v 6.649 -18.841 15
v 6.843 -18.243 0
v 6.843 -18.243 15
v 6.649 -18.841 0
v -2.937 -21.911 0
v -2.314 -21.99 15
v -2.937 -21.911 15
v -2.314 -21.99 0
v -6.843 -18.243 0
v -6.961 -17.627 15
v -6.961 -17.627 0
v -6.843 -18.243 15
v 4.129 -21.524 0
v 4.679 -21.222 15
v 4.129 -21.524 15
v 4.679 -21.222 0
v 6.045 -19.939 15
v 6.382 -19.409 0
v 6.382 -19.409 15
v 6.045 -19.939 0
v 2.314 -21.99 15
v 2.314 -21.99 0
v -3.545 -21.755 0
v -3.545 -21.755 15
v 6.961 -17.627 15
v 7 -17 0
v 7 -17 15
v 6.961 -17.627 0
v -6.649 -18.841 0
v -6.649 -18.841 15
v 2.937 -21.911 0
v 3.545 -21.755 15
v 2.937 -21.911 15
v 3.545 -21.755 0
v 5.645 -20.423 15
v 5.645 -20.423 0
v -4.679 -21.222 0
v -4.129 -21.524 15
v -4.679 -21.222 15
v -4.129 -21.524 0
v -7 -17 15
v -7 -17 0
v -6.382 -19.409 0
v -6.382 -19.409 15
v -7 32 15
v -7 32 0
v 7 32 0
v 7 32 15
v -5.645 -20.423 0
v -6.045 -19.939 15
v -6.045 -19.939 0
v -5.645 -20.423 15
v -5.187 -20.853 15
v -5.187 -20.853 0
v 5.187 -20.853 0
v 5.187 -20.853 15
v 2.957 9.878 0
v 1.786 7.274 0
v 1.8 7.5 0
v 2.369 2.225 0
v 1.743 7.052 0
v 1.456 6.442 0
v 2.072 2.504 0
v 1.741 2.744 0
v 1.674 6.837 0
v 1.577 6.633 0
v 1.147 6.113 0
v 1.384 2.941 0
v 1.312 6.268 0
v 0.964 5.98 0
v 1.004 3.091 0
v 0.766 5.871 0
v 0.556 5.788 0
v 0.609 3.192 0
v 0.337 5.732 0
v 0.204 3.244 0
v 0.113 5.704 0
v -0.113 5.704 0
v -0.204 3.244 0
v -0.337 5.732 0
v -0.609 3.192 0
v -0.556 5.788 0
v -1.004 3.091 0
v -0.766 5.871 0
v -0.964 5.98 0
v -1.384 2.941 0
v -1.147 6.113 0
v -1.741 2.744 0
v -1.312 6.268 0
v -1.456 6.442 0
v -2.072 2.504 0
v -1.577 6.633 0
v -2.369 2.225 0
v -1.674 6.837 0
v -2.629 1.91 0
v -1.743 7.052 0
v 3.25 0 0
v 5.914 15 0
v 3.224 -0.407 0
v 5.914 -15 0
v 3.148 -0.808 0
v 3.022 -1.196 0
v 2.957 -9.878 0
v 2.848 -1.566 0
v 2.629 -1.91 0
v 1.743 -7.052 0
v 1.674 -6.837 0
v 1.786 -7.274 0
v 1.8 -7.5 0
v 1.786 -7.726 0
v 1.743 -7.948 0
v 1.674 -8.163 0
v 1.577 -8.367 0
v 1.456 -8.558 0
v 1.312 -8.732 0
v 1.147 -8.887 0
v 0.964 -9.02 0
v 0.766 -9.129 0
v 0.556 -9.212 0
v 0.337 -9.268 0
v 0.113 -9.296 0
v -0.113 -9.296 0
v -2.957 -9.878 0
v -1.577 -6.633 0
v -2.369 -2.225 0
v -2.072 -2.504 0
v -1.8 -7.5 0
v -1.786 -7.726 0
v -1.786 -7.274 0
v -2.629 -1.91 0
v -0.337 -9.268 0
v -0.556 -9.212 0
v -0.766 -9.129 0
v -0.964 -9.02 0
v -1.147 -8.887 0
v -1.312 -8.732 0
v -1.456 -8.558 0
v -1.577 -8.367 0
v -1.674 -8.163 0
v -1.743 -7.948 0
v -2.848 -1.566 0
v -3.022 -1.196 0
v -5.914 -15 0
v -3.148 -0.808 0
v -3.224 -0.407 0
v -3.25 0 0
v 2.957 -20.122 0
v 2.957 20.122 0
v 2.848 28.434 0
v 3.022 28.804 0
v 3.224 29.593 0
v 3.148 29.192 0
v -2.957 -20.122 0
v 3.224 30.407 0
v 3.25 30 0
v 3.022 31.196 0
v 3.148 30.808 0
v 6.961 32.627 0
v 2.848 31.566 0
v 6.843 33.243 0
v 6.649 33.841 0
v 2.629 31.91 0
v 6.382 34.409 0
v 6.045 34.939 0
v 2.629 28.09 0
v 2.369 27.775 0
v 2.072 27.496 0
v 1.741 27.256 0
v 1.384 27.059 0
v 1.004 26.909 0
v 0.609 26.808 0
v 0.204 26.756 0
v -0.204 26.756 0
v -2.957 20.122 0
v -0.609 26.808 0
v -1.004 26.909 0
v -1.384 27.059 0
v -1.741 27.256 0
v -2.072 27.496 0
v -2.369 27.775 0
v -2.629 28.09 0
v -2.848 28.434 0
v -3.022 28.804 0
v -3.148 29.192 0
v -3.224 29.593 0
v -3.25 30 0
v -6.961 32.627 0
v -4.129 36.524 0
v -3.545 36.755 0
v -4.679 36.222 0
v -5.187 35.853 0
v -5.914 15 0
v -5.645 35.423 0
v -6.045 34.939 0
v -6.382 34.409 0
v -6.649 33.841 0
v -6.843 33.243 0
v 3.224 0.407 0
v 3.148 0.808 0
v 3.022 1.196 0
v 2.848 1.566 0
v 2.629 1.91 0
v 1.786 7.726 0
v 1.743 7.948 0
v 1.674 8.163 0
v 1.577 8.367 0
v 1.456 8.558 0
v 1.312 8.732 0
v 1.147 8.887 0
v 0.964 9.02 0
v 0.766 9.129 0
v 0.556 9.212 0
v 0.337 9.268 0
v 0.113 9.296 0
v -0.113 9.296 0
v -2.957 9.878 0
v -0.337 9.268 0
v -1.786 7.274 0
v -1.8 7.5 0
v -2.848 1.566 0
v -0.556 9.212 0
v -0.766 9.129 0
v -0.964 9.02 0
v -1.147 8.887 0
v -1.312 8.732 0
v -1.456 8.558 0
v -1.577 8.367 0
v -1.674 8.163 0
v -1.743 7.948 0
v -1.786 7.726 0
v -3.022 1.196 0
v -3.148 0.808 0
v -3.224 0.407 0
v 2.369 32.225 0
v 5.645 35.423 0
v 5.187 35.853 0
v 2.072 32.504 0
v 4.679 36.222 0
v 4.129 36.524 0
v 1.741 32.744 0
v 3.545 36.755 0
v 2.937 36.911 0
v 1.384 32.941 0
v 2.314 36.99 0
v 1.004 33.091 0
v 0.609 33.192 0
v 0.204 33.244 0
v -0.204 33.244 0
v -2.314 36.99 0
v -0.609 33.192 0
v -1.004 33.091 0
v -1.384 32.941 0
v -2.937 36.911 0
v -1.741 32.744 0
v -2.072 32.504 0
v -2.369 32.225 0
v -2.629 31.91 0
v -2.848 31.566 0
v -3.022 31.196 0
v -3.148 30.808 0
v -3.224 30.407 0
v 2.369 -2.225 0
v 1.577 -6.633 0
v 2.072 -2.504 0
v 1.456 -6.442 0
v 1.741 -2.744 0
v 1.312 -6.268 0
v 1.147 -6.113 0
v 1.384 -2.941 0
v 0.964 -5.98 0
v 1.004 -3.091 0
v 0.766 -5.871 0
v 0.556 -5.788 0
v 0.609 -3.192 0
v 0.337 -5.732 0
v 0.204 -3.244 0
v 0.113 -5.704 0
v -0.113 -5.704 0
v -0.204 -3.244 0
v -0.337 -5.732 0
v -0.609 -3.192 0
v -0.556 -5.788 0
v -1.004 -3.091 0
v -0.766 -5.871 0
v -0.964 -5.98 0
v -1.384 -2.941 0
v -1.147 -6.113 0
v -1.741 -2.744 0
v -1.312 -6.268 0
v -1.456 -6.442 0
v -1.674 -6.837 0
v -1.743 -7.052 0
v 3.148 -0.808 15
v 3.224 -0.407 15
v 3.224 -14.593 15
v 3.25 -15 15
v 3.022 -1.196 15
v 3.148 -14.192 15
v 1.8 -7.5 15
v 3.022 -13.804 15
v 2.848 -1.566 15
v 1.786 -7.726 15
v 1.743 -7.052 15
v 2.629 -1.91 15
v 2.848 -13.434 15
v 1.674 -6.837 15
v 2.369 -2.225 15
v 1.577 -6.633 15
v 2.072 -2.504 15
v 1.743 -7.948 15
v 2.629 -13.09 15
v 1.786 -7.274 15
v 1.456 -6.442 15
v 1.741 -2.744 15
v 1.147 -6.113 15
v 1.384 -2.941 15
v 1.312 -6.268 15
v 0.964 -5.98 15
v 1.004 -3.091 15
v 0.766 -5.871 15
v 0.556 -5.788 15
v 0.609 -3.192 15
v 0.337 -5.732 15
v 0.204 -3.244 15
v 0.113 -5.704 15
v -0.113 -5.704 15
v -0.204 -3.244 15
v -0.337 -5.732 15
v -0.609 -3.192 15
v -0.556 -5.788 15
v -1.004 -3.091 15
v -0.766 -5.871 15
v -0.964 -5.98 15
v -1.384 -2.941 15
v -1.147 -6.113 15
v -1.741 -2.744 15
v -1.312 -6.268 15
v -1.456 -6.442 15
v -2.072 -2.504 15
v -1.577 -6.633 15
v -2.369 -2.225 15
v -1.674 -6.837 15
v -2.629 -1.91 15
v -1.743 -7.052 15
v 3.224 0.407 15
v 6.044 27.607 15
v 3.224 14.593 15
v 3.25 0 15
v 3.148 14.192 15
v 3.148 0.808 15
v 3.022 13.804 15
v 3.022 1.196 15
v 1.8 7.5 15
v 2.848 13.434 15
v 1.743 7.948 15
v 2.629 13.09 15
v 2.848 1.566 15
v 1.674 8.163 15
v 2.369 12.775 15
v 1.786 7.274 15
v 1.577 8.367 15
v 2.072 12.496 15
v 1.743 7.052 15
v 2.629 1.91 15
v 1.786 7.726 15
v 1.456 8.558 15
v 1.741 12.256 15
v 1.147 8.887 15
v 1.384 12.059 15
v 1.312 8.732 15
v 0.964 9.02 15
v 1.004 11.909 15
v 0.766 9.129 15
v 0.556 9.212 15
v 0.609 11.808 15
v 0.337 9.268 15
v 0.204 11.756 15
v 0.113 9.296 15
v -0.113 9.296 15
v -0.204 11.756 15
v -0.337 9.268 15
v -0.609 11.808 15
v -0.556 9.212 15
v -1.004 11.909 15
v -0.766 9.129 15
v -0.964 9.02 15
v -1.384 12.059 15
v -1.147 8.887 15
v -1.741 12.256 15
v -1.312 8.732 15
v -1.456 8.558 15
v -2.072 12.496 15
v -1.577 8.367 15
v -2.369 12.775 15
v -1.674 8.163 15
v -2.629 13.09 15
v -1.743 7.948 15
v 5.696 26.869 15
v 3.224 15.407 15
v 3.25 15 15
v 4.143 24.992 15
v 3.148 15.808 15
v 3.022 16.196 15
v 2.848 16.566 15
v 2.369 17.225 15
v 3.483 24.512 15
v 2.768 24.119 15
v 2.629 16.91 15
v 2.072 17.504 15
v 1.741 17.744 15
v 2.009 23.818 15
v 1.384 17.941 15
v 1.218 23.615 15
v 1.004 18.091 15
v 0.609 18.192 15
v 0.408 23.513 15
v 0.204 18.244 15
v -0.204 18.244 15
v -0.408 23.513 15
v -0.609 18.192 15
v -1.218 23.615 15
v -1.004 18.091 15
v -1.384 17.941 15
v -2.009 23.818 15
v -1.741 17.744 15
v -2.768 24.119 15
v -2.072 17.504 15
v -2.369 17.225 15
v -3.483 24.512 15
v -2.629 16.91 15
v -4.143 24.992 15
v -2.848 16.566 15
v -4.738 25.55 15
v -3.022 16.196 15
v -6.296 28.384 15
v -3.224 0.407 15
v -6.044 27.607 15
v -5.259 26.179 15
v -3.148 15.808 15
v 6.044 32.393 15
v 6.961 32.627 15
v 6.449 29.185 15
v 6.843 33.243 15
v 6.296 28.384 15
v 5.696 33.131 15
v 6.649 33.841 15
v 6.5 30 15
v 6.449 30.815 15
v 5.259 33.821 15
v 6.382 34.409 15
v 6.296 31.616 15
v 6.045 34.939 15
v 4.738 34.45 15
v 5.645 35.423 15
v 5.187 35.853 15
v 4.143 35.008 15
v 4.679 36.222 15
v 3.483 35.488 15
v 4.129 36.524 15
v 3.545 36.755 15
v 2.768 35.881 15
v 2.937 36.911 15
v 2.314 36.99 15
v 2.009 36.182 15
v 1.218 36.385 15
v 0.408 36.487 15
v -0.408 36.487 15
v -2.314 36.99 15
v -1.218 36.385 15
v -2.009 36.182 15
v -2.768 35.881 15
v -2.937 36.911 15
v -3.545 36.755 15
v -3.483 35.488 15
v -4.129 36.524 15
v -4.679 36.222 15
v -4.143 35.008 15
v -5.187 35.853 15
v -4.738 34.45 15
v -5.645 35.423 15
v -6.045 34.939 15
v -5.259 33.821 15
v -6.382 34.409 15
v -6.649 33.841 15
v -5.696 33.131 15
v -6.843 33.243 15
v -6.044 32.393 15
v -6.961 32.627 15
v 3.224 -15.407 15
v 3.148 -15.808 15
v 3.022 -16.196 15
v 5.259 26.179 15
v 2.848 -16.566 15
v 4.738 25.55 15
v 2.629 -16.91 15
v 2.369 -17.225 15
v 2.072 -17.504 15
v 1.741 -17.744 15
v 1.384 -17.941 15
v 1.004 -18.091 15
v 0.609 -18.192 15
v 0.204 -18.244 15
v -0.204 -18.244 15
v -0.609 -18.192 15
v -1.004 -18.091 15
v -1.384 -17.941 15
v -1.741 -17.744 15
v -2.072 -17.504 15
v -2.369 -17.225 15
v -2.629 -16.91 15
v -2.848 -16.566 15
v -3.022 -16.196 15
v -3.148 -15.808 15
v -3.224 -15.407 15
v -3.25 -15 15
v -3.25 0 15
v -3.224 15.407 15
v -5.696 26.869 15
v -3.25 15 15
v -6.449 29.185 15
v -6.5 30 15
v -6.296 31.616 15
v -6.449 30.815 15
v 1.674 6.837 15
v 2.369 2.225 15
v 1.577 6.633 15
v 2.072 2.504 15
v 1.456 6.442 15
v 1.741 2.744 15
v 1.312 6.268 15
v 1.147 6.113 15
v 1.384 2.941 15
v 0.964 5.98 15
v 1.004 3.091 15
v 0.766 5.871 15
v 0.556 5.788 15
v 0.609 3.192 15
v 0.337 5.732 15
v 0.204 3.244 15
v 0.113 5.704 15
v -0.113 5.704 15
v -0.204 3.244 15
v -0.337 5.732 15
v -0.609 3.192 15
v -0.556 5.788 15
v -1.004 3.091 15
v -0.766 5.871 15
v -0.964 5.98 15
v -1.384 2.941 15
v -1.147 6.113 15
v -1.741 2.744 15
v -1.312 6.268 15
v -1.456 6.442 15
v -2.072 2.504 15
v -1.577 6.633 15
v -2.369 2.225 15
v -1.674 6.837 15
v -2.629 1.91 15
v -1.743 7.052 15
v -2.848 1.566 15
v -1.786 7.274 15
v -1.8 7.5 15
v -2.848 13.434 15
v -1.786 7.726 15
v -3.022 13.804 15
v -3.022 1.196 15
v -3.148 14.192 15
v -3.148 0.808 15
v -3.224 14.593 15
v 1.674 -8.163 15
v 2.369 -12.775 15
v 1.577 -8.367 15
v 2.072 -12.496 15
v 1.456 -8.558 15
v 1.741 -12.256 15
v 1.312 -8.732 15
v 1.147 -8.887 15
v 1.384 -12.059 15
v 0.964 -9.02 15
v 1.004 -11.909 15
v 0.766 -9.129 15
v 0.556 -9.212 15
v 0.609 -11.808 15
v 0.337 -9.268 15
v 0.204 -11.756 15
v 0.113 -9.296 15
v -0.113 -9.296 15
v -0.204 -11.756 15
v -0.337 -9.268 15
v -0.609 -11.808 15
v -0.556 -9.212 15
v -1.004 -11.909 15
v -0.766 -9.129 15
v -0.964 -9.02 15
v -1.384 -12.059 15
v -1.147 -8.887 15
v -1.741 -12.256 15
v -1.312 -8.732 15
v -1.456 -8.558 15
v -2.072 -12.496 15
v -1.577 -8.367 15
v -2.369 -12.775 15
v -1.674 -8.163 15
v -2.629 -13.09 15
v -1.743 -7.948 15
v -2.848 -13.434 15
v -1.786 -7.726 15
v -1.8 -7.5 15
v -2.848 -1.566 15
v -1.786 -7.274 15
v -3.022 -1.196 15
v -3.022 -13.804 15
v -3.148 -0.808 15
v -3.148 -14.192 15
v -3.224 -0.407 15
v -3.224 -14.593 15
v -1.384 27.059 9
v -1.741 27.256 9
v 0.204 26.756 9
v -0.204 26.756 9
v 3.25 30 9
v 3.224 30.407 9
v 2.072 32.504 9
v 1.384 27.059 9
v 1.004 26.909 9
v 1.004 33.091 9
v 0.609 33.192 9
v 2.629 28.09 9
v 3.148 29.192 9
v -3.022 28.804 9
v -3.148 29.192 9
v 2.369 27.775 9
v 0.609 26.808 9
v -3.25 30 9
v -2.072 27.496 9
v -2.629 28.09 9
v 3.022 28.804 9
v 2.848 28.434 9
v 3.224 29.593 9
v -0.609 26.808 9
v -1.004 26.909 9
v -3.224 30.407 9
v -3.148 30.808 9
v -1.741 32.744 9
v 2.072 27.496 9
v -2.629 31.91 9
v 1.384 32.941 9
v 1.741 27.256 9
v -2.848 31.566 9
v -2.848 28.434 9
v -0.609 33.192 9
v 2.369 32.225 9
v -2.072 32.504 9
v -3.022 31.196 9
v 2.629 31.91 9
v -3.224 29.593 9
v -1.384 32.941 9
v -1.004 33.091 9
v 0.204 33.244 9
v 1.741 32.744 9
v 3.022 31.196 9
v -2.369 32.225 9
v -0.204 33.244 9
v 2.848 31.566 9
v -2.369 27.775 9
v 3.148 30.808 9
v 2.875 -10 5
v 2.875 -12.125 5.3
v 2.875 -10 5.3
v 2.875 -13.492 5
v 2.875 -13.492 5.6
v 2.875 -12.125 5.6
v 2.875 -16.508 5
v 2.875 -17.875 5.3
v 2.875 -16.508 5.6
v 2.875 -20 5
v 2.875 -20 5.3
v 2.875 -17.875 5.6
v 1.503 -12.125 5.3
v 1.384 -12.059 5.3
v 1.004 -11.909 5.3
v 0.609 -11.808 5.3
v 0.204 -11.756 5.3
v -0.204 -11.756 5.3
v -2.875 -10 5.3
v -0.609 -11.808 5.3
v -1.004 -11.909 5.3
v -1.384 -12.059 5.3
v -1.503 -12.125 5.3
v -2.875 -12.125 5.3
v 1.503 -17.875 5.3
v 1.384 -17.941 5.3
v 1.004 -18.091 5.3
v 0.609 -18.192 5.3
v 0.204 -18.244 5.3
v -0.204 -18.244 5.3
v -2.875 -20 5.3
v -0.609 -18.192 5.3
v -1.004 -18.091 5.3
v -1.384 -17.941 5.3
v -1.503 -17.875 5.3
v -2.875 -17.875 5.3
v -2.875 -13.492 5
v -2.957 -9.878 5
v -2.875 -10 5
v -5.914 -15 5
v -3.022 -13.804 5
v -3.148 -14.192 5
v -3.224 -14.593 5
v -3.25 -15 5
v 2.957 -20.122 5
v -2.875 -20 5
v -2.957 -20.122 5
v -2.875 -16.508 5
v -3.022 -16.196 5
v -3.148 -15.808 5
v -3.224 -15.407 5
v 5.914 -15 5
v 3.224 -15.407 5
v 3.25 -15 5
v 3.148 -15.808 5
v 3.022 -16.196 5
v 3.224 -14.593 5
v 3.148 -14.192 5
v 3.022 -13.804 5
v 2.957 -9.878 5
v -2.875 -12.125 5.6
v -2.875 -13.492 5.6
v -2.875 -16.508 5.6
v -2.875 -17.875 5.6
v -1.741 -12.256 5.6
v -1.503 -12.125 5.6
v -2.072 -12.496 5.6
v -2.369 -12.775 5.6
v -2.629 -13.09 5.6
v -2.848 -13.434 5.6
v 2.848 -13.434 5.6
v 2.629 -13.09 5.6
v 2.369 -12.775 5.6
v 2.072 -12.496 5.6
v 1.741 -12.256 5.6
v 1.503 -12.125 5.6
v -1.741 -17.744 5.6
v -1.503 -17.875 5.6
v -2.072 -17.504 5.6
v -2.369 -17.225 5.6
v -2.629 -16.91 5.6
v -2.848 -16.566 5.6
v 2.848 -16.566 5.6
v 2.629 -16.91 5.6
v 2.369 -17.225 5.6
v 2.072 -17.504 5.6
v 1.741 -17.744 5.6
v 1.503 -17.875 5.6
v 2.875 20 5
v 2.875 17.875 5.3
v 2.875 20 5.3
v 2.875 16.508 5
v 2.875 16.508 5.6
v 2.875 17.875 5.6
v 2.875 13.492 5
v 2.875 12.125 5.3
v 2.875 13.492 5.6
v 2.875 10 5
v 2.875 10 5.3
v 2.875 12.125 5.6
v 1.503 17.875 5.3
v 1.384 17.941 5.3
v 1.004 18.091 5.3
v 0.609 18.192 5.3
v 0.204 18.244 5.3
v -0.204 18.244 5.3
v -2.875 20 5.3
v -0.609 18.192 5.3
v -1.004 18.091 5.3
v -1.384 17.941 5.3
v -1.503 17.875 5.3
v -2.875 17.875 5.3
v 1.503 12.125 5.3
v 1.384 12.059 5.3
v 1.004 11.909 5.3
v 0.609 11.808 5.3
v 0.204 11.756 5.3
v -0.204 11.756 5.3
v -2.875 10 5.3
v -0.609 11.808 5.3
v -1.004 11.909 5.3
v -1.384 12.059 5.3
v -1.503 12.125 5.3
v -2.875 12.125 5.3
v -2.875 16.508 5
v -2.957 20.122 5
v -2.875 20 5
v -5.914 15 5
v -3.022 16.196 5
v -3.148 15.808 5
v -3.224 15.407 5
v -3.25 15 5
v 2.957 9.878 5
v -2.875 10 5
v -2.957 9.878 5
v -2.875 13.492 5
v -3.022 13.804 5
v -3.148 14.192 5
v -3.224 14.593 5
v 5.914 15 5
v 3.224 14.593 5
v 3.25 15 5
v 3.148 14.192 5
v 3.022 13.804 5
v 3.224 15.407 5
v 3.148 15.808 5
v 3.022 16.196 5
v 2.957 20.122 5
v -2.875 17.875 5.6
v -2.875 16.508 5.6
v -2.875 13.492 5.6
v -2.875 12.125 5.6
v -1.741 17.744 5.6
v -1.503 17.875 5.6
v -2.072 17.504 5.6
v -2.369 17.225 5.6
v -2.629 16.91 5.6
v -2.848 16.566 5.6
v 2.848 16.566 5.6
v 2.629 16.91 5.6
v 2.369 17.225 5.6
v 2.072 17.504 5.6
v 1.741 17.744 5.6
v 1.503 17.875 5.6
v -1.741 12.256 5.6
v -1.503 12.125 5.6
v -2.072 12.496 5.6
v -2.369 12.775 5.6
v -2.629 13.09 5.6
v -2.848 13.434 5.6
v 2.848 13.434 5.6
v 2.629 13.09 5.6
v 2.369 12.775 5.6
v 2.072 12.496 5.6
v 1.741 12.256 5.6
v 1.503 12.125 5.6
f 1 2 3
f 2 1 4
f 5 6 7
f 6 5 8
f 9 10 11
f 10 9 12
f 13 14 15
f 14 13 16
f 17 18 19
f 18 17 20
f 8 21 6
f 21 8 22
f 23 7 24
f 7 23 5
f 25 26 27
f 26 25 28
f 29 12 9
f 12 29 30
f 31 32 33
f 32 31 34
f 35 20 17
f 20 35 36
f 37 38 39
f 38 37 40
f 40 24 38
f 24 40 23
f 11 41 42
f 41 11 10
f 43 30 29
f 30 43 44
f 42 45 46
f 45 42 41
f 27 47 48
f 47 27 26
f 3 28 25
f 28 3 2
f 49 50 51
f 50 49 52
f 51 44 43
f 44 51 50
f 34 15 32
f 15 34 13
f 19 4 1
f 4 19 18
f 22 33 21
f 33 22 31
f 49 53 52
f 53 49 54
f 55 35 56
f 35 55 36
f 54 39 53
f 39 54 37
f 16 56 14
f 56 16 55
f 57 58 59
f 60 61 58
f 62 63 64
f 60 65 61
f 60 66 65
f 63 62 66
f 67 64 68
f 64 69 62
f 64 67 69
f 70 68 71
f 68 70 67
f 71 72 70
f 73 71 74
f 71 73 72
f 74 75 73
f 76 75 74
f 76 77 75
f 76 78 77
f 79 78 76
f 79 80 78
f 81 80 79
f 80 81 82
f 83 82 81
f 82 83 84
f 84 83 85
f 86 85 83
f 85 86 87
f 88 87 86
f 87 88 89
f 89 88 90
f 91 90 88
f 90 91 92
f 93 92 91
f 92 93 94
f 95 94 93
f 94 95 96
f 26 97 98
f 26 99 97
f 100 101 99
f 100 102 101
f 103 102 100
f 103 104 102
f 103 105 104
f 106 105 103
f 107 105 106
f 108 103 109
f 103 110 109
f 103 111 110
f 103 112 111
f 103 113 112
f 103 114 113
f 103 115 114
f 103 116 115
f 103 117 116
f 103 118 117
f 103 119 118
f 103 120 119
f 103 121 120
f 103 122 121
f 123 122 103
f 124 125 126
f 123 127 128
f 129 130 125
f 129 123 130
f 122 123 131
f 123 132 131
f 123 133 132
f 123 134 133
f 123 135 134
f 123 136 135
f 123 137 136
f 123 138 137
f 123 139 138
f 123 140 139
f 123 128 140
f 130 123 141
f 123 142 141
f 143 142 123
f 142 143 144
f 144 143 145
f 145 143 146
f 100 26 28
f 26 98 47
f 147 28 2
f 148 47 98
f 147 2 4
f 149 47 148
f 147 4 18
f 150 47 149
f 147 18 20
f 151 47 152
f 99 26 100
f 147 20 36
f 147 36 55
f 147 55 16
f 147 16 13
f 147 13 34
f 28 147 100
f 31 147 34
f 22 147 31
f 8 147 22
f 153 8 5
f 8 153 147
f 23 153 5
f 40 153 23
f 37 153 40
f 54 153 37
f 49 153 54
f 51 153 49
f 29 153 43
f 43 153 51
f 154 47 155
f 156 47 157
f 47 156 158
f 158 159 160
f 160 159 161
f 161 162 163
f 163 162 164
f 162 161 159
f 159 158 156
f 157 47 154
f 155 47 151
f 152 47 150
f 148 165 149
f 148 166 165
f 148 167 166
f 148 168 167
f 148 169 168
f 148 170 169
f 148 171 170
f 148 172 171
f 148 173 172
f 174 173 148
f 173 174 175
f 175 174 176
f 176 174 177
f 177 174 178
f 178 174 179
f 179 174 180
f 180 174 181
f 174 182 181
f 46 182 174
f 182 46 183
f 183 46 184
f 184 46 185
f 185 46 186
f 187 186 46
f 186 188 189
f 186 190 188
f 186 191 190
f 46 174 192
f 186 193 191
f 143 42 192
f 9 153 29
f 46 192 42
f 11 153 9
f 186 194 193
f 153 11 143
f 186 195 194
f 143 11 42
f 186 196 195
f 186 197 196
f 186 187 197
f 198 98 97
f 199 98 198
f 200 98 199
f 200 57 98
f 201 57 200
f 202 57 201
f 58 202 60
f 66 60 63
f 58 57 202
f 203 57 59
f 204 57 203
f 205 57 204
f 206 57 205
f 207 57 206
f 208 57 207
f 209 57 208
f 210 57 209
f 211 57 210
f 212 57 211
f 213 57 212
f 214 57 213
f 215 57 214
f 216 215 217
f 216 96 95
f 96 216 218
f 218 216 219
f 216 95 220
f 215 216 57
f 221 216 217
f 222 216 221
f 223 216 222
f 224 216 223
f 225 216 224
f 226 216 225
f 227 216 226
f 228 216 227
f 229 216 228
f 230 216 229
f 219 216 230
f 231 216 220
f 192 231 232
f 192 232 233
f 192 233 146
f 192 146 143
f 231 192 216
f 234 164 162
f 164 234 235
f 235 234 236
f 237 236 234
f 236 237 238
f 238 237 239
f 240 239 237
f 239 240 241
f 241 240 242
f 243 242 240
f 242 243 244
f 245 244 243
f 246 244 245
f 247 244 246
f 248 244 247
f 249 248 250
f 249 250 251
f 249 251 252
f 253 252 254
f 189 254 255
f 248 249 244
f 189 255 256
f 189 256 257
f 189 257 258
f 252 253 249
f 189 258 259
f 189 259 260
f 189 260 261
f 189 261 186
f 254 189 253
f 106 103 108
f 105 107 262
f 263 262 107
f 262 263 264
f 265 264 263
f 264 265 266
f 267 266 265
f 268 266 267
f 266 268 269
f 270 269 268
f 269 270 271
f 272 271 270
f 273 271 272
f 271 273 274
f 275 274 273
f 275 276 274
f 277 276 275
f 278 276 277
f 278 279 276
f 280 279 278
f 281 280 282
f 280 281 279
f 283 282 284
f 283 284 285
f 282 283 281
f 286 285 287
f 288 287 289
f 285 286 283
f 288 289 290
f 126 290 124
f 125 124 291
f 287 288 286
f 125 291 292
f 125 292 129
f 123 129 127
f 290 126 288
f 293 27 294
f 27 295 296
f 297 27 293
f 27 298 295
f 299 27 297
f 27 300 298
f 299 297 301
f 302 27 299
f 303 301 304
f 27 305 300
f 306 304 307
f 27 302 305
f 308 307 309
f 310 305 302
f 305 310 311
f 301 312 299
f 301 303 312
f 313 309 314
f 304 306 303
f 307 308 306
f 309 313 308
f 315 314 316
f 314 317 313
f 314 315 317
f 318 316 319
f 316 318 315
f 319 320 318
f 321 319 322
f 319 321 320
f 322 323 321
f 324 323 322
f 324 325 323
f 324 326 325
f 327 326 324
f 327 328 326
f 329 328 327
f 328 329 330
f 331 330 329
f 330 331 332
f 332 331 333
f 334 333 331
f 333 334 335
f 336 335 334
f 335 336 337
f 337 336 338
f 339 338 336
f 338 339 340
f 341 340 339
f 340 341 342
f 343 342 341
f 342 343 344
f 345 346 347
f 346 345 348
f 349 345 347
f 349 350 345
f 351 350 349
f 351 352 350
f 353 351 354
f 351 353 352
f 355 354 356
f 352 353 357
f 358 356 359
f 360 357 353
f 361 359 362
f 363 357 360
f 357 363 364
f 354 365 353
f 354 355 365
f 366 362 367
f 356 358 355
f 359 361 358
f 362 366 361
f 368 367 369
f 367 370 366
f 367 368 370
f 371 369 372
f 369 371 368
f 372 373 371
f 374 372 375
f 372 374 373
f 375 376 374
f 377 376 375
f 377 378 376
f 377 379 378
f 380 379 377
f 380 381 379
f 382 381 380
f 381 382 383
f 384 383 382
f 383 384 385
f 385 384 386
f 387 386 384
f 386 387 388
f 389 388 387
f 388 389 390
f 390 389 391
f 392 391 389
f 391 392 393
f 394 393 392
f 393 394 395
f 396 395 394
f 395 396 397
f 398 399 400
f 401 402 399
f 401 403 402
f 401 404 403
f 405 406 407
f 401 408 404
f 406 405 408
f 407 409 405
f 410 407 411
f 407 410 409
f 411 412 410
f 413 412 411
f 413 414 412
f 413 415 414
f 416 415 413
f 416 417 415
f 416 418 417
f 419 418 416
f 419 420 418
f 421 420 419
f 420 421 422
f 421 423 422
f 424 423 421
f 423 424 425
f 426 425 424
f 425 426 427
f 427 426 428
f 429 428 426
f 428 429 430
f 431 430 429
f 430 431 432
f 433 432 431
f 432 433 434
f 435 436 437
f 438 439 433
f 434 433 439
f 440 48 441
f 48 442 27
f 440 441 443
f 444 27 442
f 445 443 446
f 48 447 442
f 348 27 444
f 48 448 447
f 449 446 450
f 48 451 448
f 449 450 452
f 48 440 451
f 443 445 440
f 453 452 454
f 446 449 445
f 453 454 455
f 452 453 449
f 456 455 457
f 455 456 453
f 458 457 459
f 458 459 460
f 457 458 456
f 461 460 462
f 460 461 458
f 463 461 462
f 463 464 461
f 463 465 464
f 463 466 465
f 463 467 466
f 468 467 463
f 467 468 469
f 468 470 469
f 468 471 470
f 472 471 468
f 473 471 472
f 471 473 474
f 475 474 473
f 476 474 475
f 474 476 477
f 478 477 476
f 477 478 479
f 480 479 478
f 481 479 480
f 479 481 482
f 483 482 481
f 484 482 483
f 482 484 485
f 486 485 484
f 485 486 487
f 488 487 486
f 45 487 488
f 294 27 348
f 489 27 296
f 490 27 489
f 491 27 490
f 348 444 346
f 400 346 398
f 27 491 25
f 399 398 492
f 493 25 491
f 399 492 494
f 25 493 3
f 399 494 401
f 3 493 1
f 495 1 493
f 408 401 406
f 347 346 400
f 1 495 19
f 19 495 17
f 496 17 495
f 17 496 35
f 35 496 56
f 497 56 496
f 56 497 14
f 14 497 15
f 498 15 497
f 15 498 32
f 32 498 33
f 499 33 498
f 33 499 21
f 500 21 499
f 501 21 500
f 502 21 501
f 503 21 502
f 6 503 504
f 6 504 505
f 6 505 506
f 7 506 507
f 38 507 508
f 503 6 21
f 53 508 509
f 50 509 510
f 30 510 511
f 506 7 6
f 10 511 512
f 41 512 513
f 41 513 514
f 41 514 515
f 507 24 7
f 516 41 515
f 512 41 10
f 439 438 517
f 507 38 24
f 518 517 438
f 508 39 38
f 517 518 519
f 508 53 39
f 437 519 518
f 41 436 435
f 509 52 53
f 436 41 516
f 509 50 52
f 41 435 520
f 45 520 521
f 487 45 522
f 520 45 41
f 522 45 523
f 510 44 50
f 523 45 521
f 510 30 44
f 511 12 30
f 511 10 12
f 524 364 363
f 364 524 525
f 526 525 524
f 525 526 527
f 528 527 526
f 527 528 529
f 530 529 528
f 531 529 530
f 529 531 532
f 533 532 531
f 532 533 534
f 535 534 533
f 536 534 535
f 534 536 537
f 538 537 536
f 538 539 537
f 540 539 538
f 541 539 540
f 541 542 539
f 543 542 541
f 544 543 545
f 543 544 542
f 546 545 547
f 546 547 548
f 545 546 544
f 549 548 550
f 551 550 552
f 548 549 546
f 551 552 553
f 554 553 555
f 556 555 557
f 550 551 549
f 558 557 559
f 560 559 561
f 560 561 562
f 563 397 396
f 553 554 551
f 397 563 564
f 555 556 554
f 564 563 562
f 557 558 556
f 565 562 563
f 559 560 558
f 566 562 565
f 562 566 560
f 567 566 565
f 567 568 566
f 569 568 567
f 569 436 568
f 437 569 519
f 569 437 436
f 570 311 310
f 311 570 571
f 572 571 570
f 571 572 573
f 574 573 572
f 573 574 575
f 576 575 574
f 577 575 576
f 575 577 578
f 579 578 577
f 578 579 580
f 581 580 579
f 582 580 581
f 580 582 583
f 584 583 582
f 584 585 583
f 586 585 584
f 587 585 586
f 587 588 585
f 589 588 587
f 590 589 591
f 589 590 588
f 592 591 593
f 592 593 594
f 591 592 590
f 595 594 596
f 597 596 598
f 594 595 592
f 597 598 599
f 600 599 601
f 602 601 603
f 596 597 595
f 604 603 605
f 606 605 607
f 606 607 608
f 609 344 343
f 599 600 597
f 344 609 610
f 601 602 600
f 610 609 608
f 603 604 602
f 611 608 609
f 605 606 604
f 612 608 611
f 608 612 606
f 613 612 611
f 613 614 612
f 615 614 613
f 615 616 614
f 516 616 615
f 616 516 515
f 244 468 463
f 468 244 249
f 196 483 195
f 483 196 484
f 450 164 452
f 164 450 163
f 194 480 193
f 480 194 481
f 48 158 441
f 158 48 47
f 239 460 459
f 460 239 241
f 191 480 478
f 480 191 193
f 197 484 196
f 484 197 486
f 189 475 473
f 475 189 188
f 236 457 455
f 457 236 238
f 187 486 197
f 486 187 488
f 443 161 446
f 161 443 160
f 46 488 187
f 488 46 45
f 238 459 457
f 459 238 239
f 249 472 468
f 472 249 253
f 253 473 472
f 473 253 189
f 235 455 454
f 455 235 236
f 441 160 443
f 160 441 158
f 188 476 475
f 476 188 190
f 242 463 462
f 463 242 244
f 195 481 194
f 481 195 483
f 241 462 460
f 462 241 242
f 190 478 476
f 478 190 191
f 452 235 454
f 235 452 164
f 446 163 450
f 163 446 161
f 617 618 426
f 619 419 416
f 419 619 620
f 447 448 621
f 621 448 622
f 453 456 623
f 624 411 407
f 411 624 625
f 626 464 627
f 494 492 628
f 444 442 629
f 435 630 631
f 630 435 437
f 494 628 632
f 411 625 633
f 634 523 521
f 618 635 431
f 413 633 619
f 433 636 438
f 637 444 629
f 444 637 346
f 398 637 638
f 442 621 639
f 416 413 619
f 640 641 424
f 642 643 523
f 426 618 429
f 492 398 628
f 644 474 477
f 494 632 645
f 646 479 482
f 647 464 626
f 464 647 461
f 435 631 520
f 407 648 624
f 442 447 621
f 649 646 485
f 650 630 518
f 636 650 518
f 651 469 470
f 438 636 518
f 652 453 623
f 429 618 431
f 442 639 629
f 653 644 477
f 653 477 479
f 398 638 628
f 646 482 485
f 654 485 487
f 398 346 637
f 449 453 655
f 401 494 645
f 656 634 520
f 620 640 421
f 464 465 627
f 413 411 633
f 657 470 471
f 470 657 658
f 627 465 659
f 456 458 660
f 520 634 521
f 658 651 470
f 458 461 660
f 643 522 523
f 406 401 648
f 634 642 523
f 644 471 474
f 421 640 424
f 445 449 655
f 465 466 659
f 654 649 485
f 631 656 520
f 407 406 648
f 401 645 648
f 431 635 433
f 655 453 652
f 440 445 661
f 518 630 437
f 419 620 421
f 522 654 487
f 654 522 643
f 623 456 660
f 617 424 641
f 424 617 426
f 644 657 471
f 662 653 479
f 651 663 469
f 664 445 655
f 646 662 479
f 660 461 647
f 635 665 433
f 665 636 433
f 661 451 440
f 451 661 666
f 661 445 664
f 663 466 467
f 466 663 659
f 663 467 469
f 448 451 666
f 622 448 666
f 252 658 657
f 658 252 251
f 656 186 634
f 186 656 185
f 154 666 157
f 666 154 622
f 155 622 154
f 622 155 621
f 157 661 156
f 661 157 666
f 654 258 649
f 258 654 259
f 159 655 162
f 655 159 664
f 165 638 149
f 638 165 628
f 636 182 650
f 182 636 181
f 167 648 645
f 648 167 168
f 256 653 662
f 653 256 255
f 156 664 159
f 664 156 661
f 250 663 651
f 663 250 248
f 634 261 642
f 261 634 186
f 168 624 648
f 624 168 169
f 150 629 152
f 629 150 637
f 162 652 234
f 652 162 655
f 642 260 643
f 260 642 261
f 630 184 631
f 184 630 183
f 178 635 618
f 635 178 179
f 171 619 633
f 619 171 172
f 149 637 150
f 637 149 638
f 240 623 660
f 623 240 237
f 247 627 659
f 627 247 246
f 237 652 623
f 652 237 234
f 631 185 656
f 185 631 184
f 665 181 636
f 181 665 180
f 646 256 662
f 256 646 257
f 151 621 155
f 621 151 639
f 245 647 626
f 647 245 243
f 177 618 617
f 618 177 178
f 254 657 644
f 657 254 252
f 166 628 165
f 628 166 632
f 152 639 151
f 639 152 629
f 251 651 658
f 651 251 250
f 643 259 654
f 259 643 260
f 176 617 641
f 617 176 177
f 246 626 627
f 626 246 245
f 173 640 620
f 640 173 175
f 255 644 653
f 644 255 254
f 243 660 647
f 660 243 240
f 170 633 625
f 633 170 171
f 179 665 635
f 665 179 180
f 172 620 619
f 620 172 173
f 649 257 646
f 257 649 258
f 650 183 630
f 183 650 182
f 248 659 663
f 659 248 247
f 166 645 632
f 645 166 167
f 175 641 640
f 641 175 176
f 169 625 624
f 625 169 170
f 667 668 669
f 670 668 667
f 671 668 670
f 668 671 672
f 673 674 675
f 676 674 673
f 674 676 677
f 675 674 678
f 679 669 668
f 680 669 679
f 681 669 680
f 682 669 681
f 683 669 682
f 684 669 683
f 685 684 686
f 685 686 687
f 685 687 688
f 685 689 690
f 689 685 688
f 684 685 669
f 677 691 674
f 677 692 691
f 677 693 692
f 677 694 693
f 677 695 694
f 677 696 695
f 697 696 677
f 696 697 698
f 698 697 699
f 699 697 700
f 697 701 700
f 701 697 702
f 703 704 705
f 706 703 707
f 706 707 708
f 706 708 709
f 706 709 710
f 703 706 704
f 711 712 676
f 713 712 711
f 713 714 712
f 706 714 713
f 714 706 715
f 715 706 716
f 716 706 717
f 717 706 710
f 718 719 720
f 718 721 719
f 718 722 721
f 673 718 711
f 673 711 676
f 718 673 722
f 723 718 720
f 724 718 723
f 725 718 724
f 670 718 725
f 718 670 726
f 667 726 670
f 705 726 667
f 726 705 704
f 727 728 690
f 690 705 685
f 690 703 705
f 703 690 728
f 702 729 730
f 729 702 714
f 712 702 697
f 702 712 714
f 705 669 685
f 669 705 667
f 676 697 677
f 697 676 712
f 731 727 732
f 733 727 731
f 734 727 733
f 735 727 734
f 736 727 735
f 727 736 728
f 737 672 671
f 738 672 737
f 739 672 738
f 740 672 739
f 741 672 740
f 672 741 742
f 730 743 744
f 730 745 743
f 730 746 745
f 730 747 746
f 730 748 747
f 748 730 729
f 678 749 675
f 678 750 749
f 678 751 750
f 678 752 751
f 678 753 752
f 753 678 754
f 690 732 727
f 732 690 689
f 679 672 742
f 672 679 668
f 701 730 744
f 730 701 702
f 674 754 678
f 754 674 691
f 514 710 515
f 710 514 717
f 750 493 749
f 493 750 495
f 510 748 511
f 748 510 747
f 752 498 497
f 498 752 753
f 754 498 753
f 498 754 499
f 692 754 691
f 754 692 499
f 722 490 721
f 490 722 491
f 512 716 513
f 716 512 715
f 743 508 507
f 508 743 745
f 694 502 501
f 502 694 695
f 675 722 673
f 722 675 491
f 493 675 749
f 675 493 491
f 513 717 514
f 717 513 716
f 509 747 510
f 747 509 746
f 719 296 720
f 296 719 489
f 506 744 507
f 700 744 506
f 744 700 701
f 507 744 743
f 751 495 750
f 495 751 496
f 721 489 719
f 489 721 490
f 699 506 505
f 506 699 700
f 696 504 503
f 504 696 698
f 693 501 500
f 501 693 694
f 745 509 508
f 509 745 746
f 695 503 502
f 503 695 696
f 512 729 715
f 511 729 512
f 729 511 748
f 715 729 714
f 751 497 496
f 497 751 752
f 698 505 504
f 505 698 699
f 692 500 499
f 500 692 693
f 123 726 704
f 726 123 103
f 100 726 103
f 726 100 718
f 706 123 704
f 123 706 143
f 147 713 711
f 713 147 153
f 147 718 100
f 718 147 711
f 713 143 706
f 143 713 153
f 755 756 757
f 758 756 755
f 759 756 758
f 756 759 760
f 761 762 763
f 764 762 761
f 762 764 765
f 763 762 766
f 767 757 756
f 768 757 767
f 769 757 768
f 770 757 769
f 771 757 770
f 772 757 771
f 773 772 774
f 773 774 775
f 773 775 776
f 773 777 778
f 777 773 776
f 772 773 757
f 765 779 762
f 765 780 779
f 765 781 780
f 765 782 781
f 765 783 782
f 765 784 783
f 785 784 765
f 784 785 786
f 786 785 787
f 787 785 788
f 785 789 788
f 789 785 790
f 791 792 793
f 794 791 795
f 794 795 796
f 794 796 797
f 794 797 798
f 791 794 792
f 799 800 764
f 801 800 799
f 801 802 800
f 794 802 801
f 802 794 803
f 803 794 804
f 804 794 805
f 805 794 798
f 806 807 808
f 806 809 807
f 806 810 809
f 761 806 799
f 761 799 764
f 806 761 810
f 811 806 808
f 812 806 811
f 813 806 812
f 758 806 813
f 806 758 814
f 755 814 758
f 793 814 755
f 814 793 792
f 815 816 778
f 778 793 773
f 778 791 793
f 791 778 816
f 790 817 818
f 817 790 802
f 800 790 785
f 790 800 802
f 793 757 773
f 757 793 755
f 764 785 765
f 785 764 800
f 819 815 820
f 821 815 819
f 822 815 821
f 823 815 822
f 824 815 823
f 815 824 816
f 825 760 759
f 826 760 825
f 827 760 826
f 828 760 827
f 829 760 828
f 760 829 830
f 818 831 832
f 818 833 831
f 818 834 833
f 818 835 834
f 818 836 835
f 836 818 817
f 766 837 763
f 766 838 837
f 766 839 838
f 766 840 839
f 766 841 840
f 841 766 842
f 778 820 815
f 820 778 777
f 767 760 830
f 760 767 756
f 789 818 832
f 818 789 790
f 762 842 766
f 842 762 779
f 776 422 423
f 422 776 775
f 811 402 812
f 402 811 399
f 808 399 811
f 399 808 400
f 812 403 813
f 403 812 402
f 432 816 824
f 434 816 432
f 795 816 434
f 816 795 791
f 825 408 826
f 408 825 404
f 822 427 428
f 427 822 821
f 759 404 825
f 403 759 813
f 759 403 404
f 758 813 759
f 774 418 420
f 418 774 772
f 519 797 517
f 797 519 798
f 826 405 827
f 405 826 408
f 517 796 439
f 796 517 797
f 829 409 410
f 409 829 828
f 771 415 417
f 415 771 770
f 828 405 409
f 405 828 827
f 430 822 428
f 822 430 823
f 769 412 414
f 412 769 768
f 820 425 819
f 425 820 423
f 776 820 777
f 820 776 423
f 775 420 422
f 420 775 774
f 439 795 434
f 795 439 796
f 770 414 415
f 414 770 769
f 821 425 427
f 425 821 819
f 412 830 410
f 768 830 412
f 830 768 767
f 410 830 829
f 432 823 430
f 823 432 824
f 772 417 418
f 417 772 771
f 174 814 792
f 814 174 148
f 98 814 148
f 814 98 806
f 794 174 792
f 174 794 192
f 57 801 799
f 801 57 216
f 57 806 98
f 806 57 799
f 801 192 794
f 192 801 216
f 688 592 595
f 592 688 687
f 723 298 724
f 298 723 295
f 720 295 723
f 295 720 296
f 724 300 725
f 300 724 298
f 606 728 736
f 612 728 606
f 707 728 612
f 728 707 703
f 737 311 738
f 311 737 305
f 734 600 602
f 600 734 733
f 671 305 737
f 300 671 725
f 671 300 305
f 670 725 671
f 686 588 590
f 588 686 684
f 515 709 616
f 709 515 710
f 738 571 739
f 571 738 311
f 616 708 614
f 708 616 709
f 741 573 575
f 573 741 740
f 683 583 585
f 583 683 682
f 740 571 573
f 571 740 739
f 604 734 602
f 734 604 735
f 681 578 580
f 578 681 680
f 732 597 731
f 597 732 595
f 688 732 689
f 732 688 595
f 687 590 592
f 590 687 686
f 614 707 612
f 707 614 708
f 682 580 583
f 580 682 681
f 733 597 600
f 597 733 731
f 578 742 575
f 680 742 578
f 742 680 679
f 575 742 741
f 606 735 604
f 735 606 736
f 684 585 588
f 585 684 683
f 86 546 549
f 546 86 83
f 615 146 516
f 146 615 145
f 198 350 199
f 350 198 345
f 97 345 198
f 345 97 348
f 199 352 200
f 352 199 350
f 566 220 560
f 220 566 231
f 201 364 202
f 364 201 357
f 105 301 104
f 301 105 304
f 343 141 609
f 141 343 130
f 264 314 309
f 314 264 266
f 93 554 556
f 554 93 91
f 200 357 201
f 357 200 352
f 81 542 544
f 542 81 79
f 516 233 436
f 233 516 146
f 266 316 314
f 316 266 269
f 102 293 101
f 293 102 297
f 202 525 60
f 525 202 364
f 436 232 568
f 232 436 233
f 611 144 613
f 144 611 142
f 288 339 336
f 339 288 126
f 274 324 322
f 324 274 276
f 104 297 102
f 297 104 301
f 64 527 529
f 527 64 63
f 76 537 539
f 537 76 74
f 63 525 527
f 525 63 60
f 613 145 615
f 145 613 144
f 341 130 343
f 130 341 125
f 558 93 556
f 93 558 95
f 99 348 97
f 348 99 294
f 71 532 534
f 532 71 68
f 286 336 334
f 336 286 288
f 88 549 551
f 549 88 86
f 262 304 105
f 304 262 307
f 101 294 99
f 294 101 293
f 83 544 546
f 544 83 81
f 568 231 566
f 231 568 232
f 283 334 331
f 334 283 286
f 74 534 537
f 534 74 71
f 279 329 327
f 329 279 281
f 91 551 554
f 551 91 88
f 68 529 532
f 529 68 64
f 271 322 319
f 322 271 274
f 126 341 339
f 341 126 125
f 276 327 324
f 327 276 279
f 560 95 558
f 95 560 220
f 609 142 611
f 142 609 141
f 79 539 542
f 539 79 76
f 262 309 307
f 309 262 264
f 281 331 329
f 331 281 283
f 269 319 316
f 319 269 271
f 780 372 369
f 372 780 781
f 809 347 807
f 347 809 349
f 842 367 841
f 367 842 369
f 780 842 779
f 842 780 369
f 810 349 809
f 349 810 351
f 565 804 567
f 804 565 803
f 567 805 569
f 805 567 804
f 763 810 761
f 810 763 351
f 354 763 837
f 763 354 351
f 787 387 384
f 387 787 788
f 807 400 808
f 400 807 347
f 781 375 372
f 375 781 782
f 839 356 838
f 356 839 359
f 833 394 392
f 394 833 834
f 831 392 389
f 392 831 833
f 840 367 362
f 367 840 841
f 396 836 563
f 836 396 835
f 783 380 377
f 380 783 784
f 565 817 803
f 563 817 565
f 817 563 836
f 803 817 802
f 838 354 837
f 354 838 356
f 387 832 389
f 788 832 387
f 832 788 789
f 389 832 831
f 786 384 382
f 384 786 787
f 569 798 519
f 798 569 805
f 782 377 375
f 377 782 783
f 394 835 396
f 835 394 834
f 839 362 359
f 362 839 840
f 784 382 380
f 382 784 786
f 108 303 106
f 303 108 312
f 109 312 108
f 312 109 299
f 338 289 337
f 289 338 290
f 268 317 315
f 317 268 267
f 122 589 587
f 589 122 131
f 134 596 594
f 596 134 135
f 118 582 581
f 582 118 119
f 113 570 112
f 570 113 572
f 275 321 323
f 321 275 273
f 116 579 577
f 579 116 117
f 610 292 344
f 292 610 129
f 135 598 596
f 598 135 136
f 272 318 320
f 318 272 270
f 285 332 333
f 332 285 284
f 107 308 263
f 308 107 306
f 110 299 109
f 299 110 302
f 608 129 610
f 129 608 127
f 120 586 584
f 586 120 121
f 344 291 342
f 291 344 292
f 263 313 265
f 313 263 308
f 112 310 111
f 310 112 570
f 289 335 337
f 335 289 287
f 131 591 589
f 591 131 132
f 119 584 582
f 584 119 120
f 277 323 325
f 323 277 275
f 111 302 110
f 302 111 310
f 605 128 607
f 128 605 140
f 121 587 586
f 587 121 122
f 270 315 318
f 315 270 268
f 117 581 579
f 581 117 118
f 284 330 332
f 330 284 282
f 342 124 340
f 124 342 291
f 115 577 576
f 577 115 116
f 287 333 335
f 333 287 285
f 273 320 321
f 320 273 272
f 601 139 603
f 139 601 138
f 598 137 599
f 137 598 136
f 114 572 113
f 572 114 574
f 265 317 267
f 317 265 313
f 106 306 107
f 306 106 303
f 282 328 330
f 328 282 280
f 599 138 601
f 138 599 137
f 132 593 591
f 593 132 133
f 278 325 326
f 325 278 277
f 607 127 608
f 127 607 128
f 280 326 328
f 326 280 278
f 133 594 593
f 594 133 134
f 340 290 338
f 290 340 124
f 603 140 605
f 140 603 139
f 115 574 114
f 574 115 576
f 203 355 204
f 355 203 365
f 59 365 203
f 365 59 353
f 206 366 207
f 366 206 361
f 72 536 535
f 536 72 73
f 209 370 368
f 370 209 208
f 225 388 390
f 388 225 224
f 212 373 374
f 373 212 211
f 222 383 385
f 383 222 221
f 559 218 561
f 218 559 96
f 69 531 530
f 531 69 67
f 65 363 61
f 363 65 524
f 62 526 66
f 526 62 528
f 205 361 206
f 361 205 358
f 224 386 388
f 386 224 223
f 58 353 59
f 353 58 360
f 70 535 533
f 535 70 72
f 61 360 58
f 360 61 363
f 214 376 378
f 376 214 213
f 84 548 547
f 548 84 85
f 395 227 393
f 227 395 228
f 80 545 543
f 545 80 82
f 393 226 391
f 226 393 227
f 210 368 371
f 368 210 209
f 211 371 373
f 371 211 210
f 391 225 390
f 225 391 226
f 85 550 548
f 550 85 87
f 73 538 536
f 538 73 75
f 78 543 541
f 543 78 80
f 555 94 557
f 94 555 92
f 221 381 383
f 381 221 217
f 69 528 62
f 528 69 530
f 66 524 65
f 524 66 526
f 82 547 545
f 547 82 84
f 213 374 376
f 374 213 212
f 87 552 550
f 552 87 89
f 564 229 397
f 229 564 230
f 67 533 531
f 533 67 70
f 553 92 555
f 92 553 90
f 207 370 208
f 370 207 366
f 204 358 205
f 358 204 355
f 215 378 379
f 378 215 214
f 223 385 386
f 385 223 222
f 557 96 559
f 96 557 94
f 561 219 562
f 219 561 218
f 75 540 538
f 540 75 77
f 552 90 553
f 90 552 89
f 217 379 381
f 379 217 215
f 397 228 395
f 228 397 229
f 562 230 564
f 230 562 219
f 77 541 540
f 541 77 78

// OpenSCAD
$fn = 50;


difference() {
	union() {
		hull() {
			translate(v = [-2.0000000000, 17.0000000000, 0]) {
				cylinder(h = 15, r = 5);
			}
			translate(v = [2.0000000000, 17.0000000000, 0]) {
				cylinder(h = 15, r = 5);
			}
			translate(v = [-2.0000000000, -17.0000000000, 0]) {
				cylinder(h = 15, r = 5);
			}
			translate(v = [2.0000000000, -17.0000000000, 0]) {
				cylinder(h = 15, r = 5);
			}
		}
		translate(v = [0.0000000000, 22.5000000000, 0]) {
			hull() {
				translate(v = [-2.0000000000, 9.5000000000, 0]) {
					cylinder(h = 15, r = 5);
				}
				translate(v = [2.0000000000, 9.5000000000, 0]) {
					cylinder(h = 15, r = 5);
				}
				translate(v = [-2.0000000000, -9.5000000000, 0]) {
					cylinder(h = 15, r = 5);
				}
				translate(v = [2.0000000000, -9.5000000000, 0]) {
					cylinder(h = 15, r = 5);
				}
			}
		}
		translate(v = [0.0000000000, 22.5000000000, 0]) {
			hull() {
				translate(v = [-2.0000000000, 9.5000000000, 0]) {
					cylinder(h = 15, r = 5);
				}
				translate(v = [2.0000000000, 9.5000000000, 0]) {
					cylinder(h = 15, r = 5);
				}
				translate(v = [-2.0000000000, -9.5000000000, 0]) {
					cylinder(h = 15, r = 5);
				}
				translate(v = [2.0000000000, -9.5000000000, 0]) {
					cylinder(h = 15, r = 5);
				}
			}
		}
	}
	union() {
		translate(v = [0.0000000000, 30.0000000000, 15]) {
			rotate(a = [0, 0, 0]) {
				difference() {
					union() {
						#translate(v = [0, 0, -15.0000000000]) {
							cylinder(h = 15, r = 2.2500000000);
						}
						#translate(v = [0, 0, -6]) {
							cylinder(h = 6, r1 = 3.2500000000, r2 = 6.5000000000);
						}
						#translate(v = [0, 0, -15.0000000000]) {
							cylinder(h = 15, r = 3.2500000000);
						}
						#translate(v = [0, 0, -15.0000000000]) {
							cylinder(h = 15, r = 2.2500000000);
						}
					}
					union();
				}
			}
		}
		translate(v = [0.0000000000, 30.0000000000, 15]) {
			rotate(a = [0, 0, 0]) {
				difference() {
					union() {
						#translate(v = [0, 0, -15.0000000000]) {
							cylinder(h = 15, r = 2.2500000000);
						}
						#translate(v = [0, 0, -6]) {
							cylinder(h = 6, r1 = 3.2500000000, r2 = 6.5000000000);
						}
						#translate(v = [0, 0, -15.0000000000]) {
							cylinder(h = 15, r = 3.2500000000);
						}
						#translate(v = [0, 0, -15.0000000000]) {
							cylinder(h = 15, r = 2.2500000000);
						}
					}
					union();
				}
			}
		}
		translate(v = [0.0000000000, -15.0000000000, 0]) {
			rotate(a = [0, 0, 0]) {
				difference() {
					union() {
						#translate(v = [-2.8750000000, -5.0000000000, -0.3000000000]) {
							cube(size = [5.7500000000, 10, 0.3000000000]);
						}
						#translate(v = [-2.8750000000, -2.8750000000, -0.6000000000]) {
							cube(size = [5.7500000000, 5.7500000000, 0.3000000000]);
						}
						#translate(v = [-2.8750000000, -5.0000000000, 5]) {
							cube(size = [5.7500000000, 10, 0.3000000000]);
						}
						#translate(v = [-2.8750000000, -2.8750000000, 5.3000000000]) {
							cube(size = [5.7500000000, 5.7500000000, 0.3000000000]);
						}
						#translate(v = [0, 0, -100.0000000000]) {
							cylinder(h = 200, r = 3.2500000000);
						}
						#linear_extrude(height = 5) {
							polygon(points = [[5.9142500000, 0.0000000000], [2.9571250000, 5.1218907443], [-2.9571250000, 5.1218907443], [-5.9142500000, 0.0000000000], [-2.9571250000, -5.1218907443], [2.9571250000, -5.1218907443]]);
						}
						#translate(v = [-2.8750000000, -5.0000000000, -0.3000000000]) {
							cube(size = [5.7500000000, 10, 0.3000000000]);
						}
						#translate(v = [-2.8750000000, -2.8750000000, -0.6000000000]) {
							cube(size = [5.7500000000, 5.7500000000, 0.3000000000]);
						}
						#translate(v = [-2.8750000000, -5.0000000000, 5]) {
							cube(size = [5.7500000000, 10, 0.3000000000]);
						}
						#translate(v = [-2.8750000000, -2.8750000000, 5.3000000000]) {
							cube(size = [5.7500000000, 5.7500000000, 0.3000000000]);
						}
						#translate(v = [0, 0, -100.0000000000]) {
							cylinder(h = 200, r = 3.2500000000);
						}
						#translate(v = [-2.8750000000, -5.0000000000, -0.3000000000]) {
							cube(size = [5.7500000000, 10, 0.3000000000]);
						}
						#translate(v = [-2.8750000000, -2.8750000000, -0.6000000000]) {
							cube(size = [5.7500000000, 5.7500000000, 0.3000000000]);
						}
						#translate(v = [-2.8750000000, -5.0000000000, 5]) {
							cube(size = [5.7500000000, 10, 0.3000000000]);
						}
						#translate(v = [-2.8750000000, -2.8750000000, 5.3000000000]) {
							cube(size = [5.7500000000, 5.7500000000, 0.3000000000]);
						}
						#translate(v = [0, 0, -100.0000000000]) {
							cylinder(h = 200, r = 3.2500000000);
						}
					}
					union();
				}
			}
		}
		translate(v = [0.0000000000, 15.0000000000, 0]) {
			rotate(a = [0, 0, 0]) {
				difference() {
					union() {
						#translate(v = [-2.8750000000, -5.0000000000, -0.3000000000]) {
							cube(size = [5.7500000000, 10, 0.3000000000]);
						}
						#translate(v = [-2.8750000000, -2.8750000000, -0.6000000000]) {
							cube(size = [5.7500000000, 5.7500000000, 0.3000000000]);
						}
						#translate(v = [-2.8750000000, -5.0000000000, 5]) {
							cube(size = [5.7500000000, 10, 0.3000000000]);
						}
						#translate(v = [-2.8750000000, -2.8750000000, 5.3000000000]) {
							cube(size = [5.7500000000, 5.7500000000, 0.3000000000]);
						}
						#translate(v = [0, 0, -100.0000000000]) {
							cylinder(h = 200, r = 3.2500000000);
						}
						#linear_extrude(height = 5) {
							polygon(points = [[5.9142500000, 0.0000000000], [2.9571250000, 5.1218907443], [-2.9571250000, 5.1218907443], [-5.9142500000, 0.0000000000], [-2.9571250000, -5.1218907443], [2.9571250000, -5.1218907443]]);
						}
						#translate(v = [-2.8750000000, -5.0000000000, -0.3000000000]) {
							cube(size = [5.7500000000, 10, 0.3000000000]);
						}
						#translate(v = [-2.8750000000, -2.8750000000, -0.6000000000]) {
							cube(size = [5.7500000000, 5.7500000000, 0.3000000000]);
						}
						#translate(v = [-2.8750000000, -5.0000000000, 5]) {
							cube(size = [5.7500000000, 10, 0.3000000000]);
						}
						#translate(v = [-2.8750000000, -2.8750000000, 5.3000000000]) {
							cube(size = [5.7500000000, 5.7500000000, 0.3000000000]);
						}
						#translate(v = [0, 0, -100.0000000000]) {
							cylinder(h = 200, r = 3.2500000000);
						}
						#translate(v = [-2.8750000000, -5.0000000000, -0.3000000000]) {
							cube(size = [5.7500000000, 10, 0.3000000000]);
						}
						#translate(v = [-2.8750000000, -2.8750000000, -0.6000000000]) {
							cube(size = [5.7500000000, 5.7500000000, 0.3000000000]);
						}
						#translate(v = [-2.8750000000, -5.0000000000, 5]) {
							cube(size = [5.7500000000, 10, 0.3000000000]);
						}
						#translate(v = [-2.8750000000, -2.8750000000, 5.3000000000]) {
							cube(size = [5.7500000000, 5.7500000000, 0.3000000000]);
						}
						#translate(v = [0, 0, -100.0000000000]) {
							cylinder(h = 200, r = 3.2500000000);
						}
					}
					union();
				}
			}
		}
		translate(v = [0.0000000000, -15.0000000000, 0]) {
			translate(v = [0, 0, -100]) {
				cylinder(h = 200, r = 3.2500000000);
			}
		}
		translate(v = [0, 0, -100]) {
			cylinder(h = 200, r = 3.2500000000);
		}
		translate(v = [0.0000000000, 15.0000000000, 0]) {
			translate(v = [0, 0, -100]) {
				cylinder(h = 200, r = 3.2500000000);
			}
		}
		translate(v = [0.0000000000, -15.0000000000, 0]) {
			translate(v = [0, 0, -100]) {
				cylinder(h = 200, r = 1.8000000000);
			}
		}
		translate(v = [0.0000000000, -7.5000000000, 0]) {
			translate(v = [0, 0, -100]) {
				cylinder(h = 200, r = 1.8000000000);
			}
		}
		translate(v = [0, 0, -100]) {
			cylinder(h = 200, r = 1.8000000000);
		}
		translate(v = [0.0000000000, 7.5000000000, 0]) {
			translate(v = [0, 0, -100]) {
				cylinder(h = 200, r = 1.8000000000);
			}
		}
		translate(v = [0.0000000000, 15.0000000000, 0]) {
			translate(v = [0, 0, -100]) {
				cylinder(h = 200, r = 1.8000000000);
			}
		}
	}
}
